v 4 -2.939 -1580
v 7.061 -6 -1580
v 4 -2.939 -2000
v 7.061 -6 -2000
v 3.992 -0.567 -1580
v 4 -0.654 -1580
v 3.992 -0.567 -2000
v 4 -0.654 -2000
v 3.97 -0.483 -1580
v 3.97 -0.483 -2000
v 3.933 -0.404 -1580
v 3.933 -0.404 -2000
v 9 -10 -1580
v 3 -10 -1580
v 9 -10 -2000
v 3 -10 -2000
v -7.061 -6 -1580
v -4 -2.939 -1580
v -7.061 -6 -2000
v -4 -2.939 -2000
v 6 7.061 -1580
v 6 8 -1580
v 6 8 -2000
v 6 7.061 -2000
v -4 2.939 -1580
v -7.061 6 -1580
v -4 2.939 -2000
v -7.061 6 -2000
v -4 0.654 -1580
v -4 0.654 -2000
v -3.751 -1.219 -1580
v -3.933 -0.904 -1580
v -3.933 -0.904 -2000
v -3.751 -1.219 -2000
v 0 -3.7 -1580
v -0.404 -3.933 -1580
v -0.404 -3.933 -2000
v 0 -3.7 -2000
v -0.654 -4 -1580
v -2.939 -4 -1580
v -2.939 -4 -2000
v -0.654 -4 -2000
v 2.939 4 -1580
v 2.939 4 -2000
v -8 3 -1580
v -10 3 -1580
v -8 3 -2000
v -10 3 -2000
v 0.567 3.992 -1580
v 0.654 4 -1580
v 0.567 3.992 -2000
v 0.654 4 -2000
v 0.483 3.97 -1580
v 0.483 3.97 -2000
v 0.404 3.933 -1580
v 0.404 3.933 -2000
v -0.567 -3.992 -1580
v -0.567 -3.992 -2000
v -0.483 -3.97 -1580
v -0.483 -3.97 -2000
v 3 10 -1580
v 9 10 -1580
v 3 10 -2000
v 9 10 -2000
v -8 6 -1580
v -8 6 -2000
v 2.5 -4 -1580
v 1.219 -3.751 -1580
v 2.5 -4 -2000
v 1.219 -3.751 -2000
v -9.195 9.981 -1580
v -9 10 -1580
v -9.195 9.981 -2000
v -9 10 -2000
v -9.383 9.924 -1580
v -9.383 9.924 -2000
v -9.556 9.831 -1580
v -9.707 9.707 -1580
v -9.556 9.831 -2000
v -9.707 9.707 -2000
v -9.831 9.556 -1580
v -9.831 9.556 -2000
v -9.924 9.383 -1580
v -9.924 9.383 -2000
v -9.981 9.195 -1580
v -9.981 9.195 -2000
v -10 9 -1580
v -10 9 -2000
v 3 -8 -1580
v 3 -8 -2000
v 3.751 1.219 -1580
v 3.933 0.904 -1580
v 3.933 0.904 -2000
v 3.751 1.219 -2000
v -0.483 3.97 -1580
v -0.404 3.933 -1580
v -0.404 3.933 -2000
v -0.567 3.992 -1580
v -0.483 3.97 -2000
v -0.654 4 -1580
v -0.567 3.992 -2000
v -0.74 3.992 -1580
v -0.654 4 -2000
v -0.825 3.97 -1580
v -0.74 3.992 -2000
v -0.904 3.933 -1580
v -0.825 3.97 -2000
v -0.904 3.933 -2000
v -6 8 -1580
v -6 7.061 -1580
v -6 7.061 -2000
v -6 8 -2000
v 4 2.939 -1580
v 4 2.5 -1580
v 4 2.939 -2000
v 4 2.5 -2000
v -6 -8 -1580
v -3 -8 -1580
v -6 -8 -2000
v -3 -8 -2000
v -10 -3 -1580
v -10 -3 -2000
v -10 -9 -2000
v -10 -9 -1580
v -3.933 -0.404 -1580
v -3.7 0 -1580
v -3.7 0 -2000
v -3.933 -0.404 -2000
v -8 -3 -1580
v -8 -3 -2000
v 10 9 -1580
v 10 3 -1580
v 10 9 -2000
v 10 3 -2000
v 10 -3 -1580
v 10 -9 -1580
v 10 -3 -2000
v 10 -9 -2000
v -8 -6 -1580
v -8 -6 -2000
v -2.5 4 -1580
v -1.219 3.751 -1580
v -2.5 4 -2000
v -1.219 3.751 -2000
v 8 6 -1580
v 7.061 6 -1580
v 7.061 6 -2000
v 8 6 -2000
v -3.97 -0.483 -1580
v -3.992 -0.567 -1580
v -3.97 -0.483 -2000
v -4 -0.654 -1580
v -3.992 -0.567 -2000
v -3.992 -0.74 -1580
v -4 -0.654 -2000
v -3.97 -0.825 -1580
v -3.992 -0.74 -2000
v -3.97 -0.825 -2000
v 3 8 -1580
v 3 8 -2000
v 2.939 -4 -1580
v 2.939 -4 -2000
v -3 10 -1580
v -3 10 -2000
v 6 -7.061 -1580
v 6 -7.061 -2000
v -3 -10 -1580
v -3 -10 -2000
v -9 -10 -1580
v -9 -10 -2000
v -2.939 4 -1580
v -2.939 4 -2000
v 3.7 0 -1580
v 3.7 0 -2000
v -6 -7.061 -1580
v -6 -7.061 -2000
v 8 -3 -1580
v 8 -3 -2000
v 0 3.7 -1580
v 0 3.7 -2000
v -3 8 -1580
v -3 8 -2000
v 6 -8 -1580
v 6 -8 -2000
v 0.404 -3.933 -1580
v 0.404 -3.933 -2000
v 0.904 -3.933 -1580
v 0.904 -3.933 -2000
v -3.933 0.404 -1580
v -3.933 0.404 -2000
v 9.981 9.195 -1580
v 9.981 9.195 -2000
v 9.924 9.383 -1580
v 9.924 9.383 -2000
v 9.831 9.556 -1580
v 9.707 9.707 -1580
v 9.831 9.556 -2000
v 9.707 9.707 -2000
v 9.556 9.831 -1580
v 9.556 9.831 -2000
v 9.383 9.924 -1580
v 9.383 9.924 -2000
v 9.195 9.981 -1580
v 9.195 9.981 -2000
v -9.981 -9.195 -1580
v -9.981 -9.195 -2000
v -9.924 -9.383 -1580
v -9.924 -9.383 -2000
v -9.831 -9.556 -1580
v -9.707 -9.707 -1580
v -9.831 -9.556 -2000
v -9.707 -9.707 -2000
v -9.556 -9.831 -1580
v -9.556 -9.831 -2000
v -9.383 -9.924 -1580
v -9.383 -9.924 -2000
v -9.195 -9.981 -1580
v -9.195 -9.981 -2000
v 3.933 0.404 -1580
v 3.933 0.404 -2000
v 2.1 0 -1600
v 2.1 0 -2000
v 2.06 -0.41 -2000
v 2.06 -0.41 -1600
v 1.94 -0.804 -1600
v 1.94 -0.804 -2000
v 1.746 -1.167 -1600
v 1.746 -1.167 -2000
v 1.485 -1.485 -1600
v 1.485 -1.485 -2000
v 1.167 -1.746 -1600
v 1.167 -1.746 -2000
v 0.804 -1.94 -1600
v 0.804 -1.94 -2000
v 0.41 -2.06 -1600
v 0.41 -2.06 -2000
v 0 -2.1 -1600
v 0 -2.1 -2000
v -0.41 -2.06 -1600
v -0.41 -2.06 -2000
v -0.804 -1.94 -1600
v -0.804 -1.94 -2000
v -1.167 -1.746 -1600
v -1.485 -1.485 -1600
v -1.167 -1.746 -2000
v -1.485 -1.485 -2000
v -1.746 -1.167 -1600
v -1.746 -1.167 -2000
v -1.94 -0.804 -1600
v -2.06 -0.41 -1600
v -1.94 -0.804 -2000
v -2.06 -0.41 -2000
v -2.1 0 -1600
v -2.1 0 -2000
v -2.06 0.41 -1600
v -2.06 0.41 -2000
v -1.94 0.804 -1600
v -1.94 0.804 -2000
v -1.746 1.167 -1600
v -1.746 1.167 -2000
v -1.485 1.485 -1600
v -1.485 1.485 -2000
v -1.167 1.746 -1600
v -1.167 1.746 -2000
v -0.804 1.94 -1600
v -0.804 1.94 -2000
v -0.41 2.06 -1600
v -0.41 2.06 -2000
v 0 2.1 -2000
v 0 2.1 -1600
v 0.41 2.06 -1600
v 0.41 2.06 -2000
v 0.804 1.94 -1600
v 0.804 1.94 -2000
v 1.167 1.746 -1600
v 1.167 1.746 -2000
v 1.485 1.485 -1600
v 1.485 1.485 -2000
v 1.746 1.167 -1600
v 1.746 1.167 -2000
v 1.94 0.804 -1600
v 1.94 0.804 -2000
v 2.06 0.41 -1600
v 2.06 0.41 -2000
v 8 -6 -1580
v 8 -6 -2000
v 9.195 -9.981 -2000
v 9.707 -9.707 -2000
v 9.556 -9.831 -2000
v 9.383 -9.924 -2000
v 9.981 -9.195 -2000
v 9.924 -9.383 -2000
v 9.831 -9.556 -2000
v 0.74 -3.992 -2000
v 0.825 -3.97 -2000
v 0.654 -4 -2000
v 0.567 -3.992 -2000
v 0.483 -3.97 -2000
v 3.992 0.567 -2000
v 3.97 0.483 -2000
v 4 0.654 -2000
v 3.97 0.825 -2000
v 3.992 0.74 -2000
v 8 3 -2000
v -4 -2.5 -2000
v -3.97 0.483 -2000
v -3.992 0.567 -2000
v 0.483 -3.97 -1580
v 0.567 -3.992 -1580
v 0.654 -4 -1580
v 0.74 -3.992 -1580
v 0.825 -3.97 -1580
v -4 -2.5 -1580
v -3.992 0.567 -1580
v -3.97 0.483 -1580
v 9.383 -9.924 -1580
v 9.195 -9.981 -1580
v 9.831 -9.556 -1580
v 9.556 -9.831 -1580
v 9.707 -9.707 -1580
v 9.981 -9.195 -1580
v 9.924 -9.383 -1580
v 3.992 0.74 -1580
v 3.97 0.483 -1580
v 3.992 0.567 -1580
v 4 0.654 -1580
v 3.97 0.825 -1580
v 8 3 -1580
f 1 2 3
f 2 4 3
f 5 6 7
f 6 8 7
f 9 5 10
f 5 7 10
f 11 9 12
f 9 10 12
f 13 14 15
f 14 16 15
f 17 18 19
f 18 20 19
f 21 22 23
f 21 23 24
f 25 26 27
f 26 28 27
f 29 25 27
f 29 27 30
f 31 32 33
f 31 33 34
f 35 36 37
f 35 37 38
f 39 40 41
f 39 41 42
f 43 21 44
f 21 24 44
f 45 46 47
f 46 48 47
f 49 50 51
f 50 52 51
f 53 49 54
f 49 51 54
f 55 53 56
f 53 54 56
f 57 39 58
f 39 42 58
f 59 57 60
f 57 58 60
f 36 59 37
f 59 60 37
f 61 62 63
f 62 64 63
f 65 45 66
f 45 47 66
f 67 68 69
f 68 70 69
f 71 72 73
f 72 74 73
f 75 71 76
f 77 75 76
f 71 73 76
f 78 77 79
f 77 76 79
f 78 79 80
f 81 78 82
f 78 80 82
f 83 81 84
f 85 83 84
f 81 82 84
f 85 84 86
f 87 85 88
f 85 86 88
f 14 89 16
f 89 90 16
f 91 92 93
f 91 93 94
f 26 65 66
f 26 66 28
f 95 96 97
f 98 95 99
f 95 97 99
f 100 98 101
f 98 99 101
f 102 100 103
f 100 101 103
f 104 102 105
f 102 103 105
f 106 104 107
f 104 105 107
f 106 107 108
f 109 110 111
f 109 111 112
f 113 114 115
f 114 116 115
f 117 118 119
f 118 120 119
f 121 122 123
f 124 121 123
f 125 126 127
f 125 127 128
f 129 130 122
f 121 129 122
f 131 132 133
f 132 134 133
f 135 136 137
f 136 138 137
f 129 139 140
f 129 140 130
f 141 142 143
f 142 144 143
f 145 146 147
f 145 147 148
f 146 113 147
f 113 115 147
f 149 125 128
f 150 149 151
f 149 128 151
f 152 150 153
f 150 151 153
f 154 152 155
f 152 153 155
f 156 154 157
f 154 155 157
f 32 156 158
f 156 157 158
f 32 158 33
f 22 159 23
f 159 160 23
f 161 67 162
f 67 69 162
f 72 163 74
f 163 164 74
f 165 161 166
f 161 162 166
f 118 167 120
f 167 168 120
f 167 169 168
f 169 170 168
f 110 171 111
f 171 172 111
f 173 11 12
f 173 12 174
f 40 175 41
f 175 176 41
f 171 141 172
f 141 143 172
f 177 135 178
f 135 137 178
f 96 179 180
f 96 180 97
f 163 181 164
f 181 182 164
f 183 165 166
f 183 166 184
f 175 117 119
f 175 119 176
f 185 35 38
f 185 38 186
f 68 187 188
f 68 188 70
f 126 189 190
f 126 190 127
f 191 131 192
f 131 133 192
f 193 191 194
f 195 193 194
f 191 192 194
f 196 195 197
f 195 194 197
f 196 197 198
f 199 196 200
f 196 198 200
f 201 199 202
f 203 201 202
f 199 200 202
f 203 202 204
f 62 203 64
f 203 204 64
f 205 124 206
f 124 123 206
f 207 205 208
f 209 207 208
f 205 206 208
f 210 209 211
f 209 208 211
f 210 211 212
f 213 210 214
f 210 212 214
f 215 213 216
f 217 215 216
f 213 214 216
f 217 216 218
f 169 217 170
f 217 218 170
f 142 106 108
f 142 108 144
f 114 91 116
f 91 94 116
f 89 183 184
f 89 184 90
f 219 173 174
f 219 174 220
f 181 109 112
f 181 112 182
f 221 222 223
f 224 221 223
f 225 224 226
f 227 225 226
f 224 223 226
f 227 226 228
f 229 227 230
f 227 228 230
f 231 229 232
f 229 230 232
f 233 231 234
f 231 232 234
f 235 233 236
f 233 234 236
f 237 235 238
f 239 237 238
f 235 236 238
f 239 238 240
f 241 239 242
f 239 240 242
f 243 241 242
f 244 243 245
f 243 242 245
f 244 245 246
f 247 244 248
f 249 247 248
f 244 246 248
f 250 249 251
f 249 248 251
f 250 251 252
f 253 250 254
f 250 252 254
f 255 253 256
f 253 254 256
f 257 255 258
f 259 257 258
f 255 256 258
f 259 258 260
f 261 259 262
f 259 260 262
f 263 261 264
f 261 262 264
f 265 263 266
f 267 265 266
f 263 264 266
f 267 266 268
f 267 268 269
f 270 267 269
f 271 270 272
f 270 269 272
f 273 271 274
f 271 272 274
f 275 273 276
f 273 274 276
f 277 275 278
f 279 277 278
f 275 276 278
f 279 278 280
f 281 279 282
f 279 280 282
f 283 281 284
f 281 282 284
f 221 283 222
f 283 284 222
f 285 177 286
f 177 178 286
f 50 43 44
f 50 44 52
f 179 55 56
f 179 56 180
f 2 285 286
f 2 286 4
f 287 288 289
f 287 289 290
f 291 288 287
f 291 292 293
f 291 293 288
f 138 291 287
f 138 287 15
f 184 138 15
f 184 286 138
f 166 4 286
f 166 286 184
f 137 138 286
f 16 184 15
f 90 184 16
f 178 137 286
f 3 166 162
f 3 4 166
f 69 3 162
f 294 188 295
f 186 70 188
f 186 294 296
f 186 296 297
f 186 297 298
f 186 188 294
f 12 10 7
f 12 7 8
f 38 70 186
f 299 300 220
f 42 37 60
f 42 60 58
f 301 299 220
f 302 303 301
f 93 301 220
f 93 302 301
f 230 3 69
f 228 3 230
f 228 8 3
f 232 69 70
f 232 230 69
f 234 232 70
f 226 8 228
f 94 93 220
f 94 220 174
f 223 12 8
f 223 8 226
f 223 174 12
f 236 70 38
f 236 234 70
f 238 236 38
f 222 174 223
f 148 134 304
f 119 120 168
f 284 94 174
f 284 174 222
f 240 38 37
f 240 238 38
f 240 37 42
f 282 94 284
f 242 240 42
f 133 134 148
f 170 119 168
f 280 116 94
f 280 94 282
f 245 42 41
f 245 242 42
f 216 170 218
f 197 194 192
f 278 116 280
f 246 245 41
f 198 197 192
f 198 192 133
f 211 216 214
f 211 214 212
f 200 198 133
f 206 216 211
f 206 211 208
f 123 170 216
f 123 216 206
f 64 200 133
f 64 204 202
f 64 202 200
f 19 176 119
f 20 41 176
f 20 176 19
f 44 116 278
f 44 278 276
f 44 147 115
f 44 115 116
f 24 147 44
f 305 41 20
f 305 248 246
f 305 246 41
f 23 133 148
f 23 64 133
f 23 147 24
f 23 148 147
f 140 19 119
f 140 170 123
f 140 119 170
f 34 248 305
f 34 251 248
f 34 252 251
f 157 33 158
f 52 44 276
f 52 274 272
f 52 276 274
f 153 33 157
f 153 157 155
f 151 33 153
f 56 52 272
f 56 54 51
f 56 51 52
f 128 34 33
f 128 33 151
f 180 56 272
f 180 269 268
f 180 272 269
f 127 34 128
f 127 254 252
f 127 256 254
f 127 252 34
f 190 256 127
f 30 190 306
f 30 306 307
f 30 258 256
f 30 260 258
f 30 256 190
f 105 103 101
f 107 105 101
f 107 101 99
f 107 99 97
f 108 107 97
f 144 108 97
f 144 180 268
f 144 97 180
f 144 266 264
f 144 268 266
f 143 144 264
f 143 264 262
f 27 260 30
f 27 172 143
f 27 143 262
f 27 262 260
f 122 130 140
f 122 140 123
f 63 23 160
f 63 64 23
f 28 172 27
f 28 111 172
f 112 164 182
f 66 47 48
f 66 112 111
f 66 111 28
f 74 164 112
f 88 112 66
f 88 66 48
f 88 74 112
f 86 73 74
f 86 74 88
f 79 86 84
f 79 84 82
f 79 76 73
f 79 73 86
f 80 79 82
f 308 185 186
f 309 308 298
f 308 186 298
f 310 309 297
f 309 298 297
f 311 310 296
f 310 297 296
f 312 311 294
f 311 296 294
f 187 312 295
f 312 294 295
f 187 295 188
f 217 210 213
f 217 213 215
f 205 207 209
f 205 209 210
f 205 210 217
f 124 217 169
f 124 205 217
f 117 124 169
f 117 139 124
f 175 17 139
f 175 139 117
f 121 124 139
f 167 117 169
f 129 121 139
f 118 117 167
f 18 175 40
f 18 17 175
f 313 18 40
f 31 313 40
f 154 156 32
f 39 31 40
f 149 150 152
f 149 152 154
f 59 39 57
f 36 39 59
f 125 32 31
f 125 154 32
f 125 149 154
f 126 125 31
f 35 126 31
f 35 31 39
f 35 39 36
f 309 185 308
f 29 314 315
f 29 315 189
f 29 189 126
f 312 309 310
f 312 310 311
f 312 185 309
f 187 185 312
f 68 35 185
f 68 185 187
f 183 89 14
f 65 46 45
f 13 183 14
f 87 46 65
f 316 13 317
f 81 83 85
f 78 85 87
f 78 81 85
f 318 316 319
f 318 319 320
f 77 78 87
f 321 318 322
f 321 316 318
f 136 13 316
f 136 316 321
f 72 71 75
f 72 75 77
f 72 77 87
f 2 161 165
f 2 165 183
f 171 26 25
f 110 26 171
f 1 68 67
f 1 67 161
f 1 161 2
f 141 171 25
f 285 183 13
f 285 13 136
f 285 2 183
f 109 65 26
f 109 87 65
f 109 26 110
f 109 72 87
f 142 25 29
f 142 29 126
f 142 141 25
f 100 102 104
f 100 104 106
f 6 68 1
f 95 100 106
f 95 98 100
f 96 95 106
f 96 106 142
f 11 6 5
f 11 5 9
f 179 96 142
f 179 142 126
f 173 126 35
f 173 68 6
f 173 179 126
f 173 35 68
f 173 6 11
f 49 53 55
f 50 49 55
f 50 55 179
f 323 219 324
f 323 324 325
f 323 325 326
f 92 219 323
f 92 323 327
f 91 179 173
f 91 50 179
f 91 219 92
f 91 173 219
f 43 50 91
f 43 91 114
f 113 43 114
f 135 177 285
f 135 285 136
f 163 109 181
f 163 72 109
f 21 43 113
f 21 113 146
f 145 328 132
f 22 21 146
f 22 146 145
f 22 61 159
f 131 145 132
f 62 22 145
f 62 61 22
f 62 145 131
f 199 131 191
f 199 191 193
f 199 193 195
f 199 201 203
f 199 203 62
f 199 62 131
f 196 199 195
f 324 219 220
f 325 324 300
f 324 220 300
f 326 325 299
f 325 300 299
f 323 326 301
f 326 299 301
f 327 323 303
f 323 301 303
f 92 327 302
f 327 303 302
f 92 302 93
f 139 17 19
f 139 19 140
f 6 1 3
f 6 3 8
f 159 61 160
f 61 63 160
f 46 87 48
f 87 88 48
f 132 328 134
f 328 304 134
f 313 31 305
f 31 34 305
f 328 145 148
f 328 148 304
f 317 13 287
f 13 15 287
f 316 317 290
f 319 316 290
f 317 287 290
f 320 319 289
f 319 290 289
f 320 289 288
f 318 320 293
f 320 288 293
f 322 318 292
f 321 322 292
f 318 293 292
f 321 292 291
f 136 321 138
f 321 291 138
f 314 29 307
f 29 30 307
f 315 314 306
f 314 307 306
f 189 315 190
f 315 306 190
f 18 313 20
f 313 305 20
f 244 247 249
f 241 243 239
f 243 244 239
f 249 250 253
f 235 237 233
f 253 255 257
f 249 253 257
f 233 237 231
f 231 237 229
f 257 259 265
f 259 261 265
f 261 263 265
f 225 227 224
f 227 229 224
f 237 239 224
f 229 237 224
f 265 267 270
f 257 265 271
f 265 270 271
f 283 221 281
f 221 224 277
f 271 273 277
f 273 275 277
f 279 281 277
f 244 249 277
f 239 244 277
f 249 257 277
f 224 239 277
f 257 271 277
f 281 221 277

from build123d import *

# Parameters (mm, degrees)
SKETCH1_R           = 2.1
BOSS_EXTRUDE1_DEPTH = 400
EXTRUDE_1_DEPTH     = 20


with BuildPart() as part:
    # Sketch1 → Boss-Extrude1 (new body)
    with BuildSketch(Plane(origin=(0, 0, -2000), x_dir=(-1, 0, 0), z_dir=(0, 0, -1))):
        with BuildLine():
            Line((10, -3), (8, -3))
            Line((8, -3), (8, -6))
            Line((8, -6), (7.060660172, -6))
            Line((7.060660172, -6), (4, -2.939339828))
            Line((4, -2.939339828), (4, -2.5))
            Line((4, -2.5), (3.750976592, -1.218885629))
            Line((3.750976592, -1.218885629), (3.933012702, -0.903589838))
            ThreePointArc((3.933012702, -0.903589838), (4, -0.653589838), (3.933012702, -0.403589838))
            Line((3.933012702, -0.403589838), (3.7, 0))
            Line((3.7, 0), (3.933012702, 0.403589838))
            ThreePointArc((3.933012702, 0.403589838), (3.982962913, 0.524180316), (4, 0.653589838))
            Line((4, 0.653589838), (4, 2.939339828))
            Line((4, 2.939339828), (7.060660172, 6))
            Line((7.060660172, 6), (8, 6))
            Line((8, 6), (8, 3))
            Line((8, 3), (10, 3))
            Line((10, 3), (10, 9))
            ThreePointArc((10, 9), (9.707106781, 9.707106781), (9, 10))
            Line((9, 10), (3, 10))
            Line((3, 10), (3, 8))
            Line((3, 8), (6, 8))
            Line((6, 8), (6, 7.060660172))
            Line((6, 7.060660172), (2.939339828, 4))
            Line((2.939339828, 4), (2.5, 4))
            Line((2.5, 4), (1.218885629, 3.750976592))
            Line((1.218885629, 3.750976592), (0.903589838, 3.933012702))
            ThreePointArc((0.903589838, 3.933012702), (0.653589838, 4), (0.403589838, 3.933012702))
            Line((0.403589838, 3.933012702), (0, 3.7))
            Line((0, 3.7), (-0.403589838, 3.933012702))
            ThreePointArc((-0.403589838, 3.933012702), (-0.524180316, 3.982962913), (-0.653589838, 4))
            Line((-0.653589838, 4), (-2.939339828, 4))
            Line((-2.939339828, 4), (-6, 7.060660172))
            Line((-6, 7.060660172), (-6, 8))
            Line((-6, 8), (-3, 8))
            Line((-3, 8), (-3, 10))
            Line((-3, 10), (-9, 10))
            ThreePointArc((-9, 10), (-9.707106781, 9.707106781), (-10, 9))
            Line((-10, 9), (-10, 3))
            Line((-10, 3), (-8, 3))
            Line((-8, 3), (-8, 6))
            Line((-8, 6), (-7.060660172, 6))
            Line((-7.060660172, 6), (-4, 2.939339828))
            Line((-4, 2.939339828), (-4, 2.5))
            Line((-4, 2.5), (-3.750976592, 1.218885629))
            Line((-3.750976592, 1.218885629), (-3.933012702, 0.903589838))
            ThreePointArc((-3.933012702, 0.903589838), (-4, 0.653589838), (-3.933012702, 0.403589838))
            Line((-3.933012702, 0.403589838), (-3.7, 0))
            Line((-3.7, 0), (-3.933012702, -0.403589838))
            ThreePointArc((-3.933012702, -0.403589838), (-3.982962913, -0.524180316), (-4, -0.653589838))
            Line((-4, -0.653589838), (-4, -2.939339828))
            Line((-4, -2.939339828), (-7.060660172, -6))
            Line((-7.060660172, -6), (-8, -6))
            Line((-8, -6), (-8, -3))
            Line((-8, -3), (-10, -3))
            Line((-10, -3), (-10, -9))
            ThreePointArc((-10, -9), (-9.707106781, -9.707106781), (-9, -10))
            Line((-9, -10), (-3, -10))
            Line((-3, -10), (-3, -8))
            Line((-3, -8), (-6, -8))
            Line((-6, -8), (-6, -7.060660172))
            Line((-6, -7.060660172), (-2.939339828, -4))
            Line((-2.939339828, -4), (-2.5, -4))
            Line((-2.5, -4), (-1.218885629, -3.750976592))
            Line((-1.218885629, -3.750976592), (-0.903589838, -3.933012702))
            ThreePointArc((-0.903589838, -3.933012702), (-0.653589838, -4), (-0.403589838, -3.933012702))
            Line((-0.403589838, -3.933012702), (0, -3.7))
            Line((0, -3.7), (0.403589838, -3.933012702))
            ThreePointArc((0.403589838, -3.933012702), (0.524180316, -3.982962913), (0.653589838, -4))
            Line((0.653589838, -4), (2.939339828, -4))
            Line((2.939339828, -4), (6, -7.060660172))
            Line((6, -7.060660172), (6, -8))
            Line((6, -8), (3, -8))
            Line((3, -8), (3, -10))
            Line((3, -10), (9, -10))
            ThreePointArc((9, -10), (9.707106781, -9.707106781), (10, -9))
            Line((10, -9), (10, -3))
        make_face()
        with Locations(Location((0, 0, 0), (0, 0, 180))):
            Circle(SKETCH1_R, mode=Mode.SUBTRACT)
    extrude(amount=-BOSS_EXTRUDE1_DEPTH)

    # 草图1 → 凸台-拉伸1 (add)
    with BuildSketch(Plane.XY.offset(-1600)):
        with BuildLine():
            Line((-10, -3), (-10, -9))
            ThreePointArc((-10, -9), (-9.707106781, -9.707106781), (-9, -10))
            Line((-9, -10), (-3, -10))
            Line((-3, -10), (-3, -8))
            Line((-3, -8), (-6, -8))
            Line((-6, -8), (-6, -7.060660172))
            Line((-6, -7.060660172), (-2.939339828, -4))
            Line((-2.939339828, -4), (-0.653589838, -4))
            ThreePointArc((-0.653589838, -4), (-0.524180316, -3.982962913), (-0.403589838, -3.933012702))
            Line((-0.403589838, -3.933012702), (0, -3.7))
            Line((0, -3.7), (0.403589838, -3.933012702))
            ThreePointArc((0.403589838, -3.933012702), (0.653589838, -4), (0.903589838, -3.933012702))
            Line((0.903589838, -3.933012702), (1.218885629, -3.750976592))
            Line((1.218885629, -3.750976592), (2.5, -4))
            Line((2.5, -4), (2.939339828, -4))
            Line((2.939339828, -4), (6, -7.060660172))
            Line((6, -7.060660172), (6, -8))
            Line((6, -8), (3, -8))
            Line((3, -8), (3, -10))
            Line((3, -10), (9, -10))
            ThreePointArc((9, -10), (9.707106781, -9.707106781), (10, -9))
            Line((10, -9), (10, -3))
            Line((10, -3), (8, -3))
            Line((8, -3), (8, -6))
            Line((8, -6), (7.060660172, -6))
            Line((7.060660172, -6), (4, -2.939339828))
            Line((4, -2.939339828), (4, -0.653589838))
            ThreePointArc((4, -0.653589838), (3.982962913, -0.524180316), (3.933012702, -0.403589838))
            Line((3.933012702, -0.403589838), (3.7, 0))
            Line((3.7, 0), (3.933012702, 0.403589838))
            ThreePointArc((3.933012702, 0.403589838), (4, 0.653589838), (3.933012702, 0.903589838))
            Line((3.933012702, 0.903589838), (3.750976592, 1.218885629))
            Line((3.750976592, 1.218885629), (4, 2.5))
            Line((4, 2.5), (4, 2.939339828))
            Line((4, 2.939339828), (7.060660172, 6))
            Line((7.060660172, 6), (8, 6))
            Line((8, 6), (8, 3))
            Line((8, 3), (10, 3))
            Line((10, 3), (10, 9))
            ThreePointArc((10, 9), (9.707106781, 9.707106781), (9, 10))
            Line((9, 10), (3, 10))
            Line((3, 10), (3, 8))
            Line((3, 8), (6, 8))
            Line((6, 8), (6, 7.060660172))
            Line((6, 7.060660172), (2.939339828, 4))
            Line((2.939339828, 4), (0.653589838, 4))
            ThreePointArc((0.653589838, 4), (0.524180316, 3.982962913), (0.403589838, 3.933012702))
            Line((0.403589838, 3.933012702), (0, 3.7))
            Line((0, 3.7), (-0.403589838, 3.933012702))
            ThreePointArc((-0.403589838, 3.933012702), (-0.653589838, 4), (-0.903589838, 3.933012702))
            Line((-0.903589838, 3.933012702), (-1.218885629, 3.750976592))
            Line((-1.218885629, 3.750976592), (-2.5, 4))
            Line((-2.5, 4), (-2.939339828, 4))
            Line((-2.939339828, 4), (-6, 7.060660172))
            Line((-6, 7.060660172), (-6, 8))
            Line((-6, 8), (-3, 8))
            Line((-3, 8), (-3, 10))
            Line((-3, 10), (-9, 10))
            ThreePointArc((-9, 10), (-9.707106781, 9.707106781), (-10, 9))
            Line((-10, 9), (-10, 3))
            Line((-10, 3), (-8, 3))
            Line((-8, 3), (-8, 6))
            Line((-8, 6), (-7.060660172, 6))
            Line((-7.060660172, 6), (-4, 2.939339828))
            Line((-4, 2.939339828), (-4, 0.653589838))
            ThreePointArc((-4, 0.653589838), (-3.982962913, 0.524180316), (-3.933012702, 0.403589838))
            Line((-3.933012702, 0.403589838), (-3.7, 0))
            Line((-3.7, 0), (-3.933012702, -0.403589838))
            ThreePointArc((-3.933012702, -0.403589838), (-4, -0.653589838), (-3.933012702, -0.903589838))
            Line((-3.933012702, -0.903589838), (-3.750976592, -1.218885629))
            Line((-3.750976592, -1.218885629), (-4, -2.5))
            Line((-4, -2.5), (-4, -2.939339828))
            Line((-4, -2.939339828), (-7.060660172, -6))
            Line((-7.060660172, -6), (-8, -6))
            Line((-8, -6), (-8, -3))
            Line((-8, -3), (-10, -3))
        make_face()
    extrude(amount=EXTRUDE_1_DEPTH)


solid = part.part
